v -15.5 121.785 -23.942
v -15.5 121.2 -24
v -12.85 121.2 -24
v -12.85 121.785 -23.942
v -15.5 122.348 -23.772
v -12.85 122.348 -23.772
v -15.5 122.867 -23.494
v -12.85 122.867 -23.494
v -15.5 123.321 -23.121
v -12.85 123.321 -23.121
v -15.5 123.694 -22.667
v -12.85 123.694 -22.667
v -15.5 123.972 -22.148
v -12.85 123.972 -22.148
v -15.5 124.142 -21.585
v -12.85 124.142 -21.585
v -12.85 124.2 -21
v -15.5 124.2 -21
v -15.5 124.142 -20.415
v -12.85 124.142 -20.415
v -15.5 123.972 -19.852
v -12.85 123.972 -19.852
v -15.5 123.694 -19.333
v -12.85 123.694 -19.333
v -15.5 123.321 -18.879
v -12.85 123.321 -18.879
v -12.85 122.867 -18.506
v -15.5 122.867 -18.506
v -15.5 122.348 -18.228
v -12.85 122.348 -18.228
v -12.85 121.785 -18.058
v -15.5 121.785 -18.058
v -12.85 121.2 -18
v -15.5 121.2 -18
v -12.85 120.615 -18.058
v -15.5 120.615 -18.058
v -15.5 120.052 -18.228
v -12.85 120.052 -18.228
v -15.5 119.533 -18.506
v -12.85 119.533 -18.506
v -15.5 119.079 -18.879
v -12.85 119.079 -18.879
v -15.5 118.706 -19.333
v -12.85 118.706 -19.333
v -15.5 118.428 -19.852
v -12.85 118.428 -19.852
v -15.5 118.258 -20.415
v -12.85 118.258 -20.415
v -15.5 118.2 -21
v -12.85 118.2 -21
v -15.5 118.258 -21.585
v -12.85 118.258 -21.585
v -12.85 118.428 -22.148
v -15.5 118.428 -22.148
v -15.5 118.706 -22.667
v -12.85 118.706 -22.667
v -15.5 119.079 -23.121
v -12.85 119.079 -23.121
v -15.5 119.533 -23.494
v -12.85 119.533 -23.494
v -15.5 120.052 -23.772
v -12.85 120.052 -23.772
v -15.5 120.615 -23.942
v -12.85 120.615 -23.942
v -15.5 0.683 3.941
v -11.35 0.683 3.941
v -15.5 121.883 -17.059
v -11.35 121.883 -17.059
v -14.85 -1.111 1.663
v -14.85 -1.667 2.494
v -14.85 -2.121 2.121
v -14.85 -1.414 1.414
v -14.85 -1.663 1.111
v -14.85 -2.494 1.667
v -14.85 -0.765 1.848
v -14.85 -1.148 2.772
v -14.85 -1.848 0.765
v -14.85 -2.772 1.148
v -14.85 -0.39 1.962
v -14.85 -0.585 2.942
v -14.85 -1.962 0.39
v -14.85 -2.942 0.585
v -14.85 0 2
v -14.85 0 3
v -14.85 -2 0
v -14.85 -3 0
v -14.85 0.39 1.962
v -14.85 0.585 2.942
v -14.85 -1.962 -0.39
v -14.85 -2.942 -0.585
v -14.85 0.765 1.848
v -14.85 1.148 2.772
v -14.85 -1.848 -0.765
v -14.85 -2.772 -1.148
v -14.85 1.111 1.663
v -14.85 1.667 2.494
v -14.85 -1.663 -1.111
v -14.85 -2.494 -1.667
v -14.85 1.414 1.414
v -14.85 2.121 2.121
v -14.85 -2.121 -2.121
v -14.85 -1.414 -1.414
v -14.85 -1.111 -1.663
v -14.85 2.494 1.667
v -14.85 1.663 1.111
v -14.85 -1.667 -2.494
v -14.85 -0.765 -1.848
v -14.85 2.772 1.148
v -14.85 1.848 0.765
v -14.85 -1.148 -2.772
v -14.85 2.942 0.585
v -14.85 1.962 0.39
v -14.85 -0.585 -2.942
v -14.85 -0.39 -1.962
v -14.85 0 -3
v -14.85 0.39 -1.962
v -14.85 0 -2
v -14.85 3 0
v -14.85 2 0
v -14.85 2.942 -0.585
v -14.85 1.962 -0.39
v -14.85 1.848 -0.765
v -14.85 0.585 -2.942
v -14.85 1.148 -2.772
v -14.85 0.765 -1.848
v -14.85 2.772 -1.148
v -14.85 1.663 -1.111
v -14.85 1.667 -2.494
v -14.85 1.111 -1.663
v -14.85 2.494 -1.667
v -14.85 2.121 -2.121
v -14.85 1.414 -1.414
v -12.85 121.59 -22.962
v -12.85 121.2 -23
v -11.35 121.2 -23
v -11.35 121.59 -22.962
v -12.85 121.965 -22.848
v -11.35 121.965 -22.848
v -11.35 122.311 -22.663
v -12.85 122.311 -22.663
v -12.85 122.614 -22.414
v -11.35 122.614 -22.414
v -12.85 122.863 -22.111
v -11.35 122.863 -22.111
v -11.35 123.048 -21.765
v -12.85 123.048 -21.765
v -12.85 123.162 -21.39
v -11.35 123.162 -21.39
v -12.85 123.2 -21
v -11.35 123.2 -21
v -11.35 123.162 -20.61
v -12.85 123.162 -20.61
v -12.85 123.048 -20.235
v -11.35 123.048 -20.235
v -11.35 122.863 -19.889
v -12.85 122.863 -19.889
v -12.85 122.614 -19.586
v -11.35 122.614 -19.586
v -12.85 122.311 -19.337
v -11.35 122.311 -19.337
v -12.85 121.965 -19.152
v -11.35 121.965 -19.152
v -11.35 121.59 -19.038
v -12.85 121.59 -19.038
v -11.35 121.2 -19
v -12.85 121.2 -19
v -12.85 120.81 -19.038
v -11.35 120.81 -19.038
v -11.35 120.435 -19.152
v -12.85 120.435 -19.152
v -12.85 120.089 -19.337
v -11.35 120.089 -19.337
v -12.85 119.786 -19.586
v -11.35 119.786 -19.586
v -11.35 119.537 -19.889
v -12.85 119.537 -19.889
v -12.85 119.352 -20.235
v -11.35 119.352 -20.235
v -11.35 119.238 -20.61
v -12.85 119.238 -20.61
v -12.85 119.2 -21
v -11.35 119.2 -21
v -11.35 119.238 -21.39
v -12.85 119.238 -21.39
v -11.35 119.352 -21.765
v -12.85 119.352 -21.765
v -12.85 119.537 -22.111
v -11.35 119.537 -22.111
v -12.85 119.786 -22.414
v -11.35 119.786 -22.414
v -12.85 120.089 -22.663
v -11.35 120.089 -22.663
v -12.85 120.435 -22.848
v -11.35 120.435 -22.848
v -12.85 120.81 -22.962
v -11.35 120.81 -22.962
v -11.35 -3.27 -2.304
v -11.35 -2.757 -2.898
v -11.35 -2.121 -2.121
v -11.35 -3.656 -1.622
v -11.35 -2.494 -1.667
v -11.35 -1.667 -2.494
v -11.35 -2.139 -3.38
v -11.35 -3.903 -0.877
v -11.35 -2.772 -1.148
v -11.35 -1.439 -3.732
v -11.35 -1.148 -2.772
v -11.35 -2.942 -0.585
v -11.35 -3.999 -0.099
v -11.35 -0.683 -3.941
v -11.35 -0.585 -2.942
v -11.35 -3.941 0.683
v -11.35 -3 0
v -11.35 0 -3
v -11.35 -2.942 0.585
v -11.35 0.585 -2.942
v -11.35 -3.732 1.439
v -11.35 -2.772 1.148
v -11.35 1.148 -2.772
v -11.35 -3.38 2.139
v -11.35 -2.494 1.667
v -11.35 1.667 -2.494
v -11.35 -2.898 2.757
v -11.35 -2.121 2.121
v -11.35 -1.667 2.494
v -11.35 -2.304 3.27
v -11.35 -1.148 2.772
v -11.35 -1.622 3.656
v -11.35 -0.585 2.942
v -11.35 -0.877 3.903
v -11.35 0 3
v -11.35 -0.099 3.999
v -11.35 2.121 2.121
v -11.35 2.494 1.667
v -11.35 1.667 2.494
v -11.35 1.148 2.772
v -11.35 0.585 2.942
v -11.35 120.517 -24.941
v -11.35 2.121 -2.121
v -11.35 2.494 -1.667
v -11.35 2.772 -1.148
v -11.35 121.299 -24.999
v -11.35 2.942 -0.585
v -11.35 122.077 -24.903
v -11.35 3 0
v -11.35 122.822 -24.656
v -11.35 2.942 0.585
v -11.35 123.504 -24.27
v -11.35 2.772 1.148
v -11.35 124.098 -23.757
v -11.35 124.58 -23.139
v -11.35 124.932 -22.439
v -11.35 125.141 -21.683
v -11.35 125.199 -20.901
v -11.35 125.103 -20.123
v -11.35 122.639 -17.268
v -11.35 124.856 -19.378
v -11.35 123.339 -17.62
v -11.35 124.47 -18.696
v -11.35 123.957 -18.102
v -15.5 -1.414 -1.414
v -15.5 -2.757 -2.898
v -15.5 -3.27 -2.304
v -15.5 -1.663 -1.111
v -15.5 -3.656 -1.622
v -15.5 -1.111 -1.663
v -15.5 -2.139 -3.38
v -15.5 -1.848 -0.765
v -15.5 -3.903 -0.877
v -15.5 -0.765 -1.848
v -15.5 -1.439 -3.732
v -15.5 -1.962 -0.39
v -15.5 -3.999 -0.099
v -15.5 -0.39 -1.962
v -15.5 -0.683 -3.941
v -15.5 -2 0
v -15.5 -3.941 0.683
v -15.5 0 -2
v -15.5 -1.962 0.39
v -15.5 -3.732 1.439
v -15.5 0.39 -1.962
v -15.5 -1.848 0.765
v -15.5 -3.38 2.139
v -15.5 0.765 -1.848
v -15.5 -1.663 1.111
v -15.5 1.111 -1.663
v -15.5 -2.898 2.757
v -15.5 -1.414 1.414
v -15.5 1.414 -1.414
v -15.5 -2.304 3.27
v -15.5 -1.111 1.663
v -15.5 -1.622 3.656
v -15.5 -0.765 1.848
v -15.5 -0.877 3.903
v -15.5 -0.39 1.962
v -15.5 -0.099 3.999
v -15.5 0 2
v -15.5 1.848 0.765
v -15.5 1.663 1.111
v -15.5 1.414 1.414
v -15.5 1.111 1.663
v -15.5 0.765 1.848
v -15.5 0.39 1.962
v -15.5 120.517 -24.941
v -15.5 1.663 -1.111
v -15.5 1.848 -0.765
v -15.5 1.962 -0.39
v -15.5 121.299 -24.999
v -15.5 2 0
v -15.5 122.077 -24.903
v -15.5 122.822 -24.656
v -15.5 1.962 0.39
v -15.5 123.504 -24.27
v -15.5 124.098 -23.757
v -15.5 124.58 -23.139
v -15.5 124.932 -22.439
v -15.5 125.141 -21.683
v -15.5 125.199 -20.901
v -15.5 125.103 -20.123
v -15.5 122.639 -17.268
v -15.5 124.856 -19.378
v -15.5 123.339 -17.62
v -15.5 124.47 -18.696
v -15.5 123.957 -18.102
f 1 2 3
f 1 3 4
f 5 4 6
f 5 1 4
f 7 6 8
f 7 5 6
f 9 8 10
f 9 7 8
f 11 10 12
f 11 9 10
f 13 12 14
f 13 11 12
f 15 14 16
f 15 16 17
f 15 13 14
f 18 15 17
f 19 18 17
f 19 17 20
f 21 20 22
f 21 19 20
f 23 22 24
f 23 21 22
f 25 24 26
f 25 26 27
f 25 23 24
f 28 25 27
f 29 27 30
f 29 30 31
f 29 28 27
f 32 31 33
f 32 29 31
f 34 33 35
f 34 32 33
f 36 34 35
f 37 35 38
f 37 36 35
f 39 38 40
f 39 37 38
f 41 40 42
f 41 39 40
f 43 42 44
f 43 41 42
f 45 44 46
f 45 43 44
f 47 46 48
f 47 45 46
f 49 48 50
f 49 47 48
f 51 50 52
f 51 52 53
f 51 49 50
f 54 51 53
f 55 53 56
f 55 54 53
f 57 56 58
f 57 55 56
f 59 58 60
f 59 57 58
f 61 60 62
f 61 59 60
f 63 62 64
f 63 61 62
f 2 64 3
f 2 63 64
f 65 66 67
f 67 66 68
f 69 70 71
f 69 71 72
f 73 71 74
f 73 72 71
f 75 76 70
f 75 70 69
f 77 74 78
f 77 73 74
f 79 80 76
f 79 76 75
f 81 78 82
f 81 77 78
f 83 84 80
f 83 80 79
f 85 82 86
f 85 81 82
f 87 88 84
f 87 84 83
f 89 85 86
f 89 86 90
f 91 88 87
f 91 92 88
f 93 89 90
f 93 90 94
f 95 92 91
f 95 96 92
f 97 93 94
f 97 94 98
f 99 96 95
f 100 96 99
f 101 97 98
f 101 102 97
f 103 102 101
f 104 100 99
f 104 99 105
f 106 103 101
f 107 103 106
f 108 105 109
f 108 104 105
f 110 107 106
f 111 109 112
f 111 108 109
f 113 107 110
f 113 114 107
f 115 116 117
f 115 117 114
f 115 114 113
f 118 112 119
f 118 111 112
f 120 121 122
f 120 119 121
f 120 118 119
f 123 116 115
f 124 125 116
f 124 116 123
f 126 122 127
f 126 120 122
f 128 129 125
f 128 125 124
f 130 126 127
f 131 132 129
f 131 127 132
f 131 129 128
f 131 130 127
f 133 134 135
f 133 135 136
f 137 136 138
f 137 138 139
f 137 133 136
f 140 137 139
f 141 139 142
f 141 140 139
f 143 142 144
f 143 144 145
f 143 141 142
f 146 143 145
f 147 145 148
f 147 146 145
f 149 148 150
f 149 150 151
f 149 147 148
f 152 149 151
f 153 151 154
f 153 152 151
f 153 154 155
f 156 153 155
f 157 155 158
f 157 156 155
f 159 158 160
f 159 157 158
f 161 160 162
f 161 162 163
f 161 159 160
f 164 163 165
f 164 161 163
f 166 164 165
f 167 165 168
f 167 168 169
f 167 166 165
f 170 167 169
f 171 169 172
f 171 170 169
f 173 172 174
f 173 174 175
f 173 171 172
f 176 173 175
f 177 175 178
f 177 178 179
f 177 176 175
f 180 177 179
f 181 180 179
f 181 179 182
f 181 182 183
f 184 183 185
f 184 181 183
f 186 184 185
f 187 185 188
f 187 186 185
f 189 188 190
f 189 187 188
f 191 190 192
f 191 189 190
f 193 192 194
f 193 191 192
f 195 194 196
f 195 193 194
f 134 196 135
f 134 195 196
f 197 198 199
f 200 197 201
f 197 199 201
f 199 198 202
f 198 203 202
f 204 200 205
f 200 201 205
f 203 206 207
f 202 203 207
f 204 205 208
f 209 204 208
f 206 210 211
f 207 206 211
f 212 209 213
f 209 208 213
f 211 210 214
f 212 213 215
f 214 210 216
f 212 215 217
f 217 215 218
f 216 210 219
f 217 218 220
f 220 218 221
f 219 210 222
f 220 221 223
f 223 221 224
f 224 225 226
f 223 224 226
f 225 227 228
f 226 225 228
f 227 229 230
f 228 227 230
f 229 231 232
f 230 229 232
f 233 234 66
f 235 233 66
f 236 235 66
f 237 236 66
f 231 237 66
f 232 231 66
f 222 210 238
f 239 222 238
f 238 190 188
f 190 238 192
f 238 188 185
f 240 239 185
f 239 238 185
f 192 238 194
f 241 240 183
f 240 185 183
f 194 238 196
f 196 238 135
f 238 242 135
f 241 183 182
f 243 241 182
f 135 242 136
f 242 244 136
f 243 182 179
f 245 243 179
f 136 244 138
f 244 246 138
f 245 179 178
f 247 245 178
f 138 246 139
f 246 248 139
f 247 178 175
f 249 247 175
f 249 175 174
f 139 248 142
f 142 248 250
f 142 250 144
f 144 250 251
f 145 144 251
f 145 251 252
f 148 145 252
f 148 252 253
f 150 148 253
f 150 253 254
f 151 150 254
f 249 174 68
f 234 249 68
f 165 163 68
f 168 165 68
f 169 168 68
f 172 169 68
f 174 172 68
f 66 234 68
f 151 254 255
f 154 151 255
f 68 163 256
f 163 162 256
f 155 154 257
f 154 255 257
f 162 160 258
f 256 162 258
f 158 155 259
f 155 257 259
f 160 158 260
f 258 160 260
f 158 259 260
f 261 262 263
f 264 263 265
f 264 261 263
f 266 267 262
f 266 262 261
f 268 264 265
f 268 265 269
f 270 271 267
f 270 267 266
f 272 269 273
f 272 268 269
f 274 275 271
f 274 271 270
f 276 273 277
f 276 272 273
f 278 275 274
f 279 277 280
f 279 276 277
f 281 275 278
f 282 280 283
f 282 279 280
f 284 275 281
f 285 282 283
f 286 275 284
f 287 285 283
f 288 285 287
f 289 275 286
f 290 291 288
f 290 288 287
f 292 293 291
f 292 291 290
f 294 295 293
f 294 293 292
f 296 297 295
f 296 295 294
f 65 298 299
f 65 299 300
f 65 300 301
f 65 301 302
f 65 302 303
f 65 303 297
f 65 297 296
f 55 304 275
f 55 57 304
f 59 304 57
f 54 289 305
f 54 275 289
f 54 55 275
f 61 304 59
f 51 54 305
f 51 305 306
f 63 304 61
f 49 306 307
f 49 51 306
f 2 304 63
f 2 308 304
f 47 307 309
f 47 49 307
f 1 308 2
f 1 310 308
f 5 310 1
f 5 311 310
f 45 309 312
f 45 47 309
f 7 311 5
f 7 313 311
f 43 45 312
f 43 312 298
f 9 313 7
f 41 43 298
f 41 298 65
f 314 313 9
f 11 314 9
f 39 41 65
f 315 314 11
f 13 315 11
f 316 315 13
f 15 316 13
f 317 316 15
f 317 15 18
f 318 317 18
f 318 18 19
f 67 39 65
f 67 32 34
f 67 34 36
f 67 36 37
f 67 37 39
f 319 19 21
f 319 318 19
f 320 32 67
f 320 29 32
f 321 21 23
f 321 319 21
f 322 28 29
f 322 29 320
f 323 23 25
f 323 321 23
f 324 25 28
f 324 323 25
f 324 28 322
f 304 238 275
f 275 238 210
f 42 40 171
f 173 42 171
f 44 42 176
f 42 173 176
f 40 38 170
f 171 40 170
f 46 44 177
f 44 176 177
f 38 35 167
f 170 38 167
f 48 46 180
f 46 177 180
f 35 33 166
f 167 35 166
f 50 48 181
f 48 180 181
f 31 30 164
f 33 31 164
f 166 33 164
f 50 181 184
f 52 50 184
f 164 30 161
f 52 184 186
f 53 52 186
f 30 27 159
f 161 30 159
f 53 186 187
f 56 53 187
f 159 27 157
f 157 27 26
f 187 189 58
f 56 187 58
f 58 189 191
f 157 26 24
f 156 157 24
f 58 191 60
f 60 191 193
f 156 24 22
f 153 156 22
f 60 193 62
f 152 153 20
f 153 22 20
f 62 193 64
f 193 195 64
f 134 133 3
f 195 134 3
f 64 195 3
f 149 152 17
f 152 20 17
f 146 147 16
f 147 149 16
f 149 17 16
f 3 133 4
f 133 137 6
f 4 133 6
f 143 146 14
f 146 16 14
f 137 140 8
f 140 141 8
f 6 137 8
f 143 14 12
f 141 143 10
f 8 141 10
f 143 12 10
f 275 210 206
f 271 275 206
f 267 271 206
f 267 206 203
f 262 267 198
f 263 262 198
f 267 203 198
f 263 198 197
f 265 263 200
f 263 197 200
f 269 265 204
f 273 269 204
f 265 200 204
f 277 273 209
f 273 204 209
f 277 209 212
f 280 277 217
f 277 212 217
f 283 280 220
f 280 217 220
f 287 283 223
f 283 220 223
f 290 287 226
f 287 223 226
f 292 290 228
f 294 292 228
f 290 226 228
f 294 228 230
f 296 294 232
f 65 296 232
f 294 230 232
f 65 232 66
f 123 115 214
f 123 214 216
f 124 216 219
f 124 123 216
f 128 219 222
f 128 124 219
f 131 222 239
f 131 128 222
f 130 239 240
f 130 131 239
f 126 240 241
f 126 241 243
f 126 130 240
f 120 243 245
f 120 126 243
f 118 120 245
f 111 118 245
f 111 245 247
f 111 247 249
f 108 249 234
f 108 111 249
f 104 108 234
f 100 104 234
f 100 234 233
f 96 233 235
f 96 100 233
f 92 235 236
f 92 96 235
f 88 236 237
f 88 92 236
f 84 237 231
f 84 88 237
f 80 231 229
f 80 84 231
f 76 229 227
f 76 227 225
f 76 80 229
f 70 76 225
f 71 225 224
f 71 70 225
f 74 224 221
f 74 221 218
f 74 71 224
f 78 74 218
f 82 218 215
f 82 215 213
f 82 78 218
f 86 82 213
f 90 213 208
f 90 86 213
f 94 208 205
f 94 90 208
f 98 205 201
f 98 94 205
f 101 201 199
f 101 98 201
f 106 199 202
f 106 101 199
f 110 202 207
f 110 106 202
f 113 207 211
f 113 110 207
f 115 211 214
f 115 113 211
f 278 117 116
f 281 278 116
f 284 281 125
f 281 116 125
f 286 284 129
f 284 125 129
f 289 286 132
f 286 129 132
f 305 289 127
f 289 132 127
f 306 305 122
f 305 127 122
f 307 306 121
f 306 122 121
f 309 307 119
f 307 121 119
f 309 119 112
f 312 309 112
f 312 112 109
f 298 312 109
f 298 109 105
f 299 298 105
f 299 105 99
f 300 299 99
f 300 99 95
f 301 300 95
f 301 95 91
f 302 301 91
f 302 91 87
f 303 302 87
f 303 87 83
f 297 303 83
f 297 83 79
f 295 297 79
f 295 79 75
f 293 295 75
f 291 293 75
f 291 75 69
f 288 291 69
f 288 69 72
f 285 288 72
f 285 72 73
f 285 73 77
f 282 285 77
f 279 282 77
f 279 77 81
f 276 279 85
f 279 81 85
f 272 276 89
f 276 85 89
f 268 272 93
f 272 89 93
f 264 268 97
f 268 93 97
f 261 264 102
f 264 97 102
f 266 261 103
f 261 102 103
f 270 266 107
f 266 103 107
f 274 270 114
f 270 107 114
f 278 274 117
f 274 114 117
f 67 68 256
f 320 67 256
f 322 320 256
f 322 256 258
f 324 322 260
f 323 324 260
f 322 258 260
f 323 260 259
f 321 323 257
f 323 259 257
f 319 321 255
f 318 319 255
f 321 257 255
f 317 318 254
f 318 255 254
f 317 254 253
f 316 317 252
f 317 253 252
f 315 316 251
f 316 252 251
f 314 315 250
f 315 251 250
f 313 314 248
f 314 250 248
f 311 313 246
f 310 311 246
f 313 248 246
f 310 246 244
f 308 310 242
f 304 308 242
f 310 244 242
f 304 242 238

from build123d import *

# Parameters (mm, degrees)
BOSS_EXTRUDE1_START = -11.35
SKETCH2_R           = 2
BOSS_EXTRUDE1_DEPTH = 4.15
CUT_EXTRUDE1_START  = -15.5
SKETCH2_3_R         = 3
SKETCH2_3_R_2       = 2
CUT_EXTRUDE1_DEPTH  = 2.65
CUT_EXTRUDE2_START  = -12.85
SKETCH2_4_R         = 2
CUT_EXTRUDE2_DEPTH  = 1.5
CUT_EXTRUDE3_START  = -14.85
SKETCH2_5_R         = 3
CUT_EXTRUDE3_DEPTH  = 3.5


with BuildPart() as part:
    # Sketch2 → Boss-Extrude1 (new body)
    with BuildSketch(Plane(origin=(0, 0, 0), x_dir=(0, 0, -1), z_dir=(1, 0, 0)).offset(BOSS_EXTRUDE1_START)):
        with BuildLine():
            Line((24.941275851, 120.517105669), (3.941275851, -0.682894331))
            ThreePointArc((3.941275851, -0.682894331), (-0.682894331, -3.941275851), (-3.941275851, 0.682894331))
            Line((-3.941275851, 0.682894331), (17.058724149, 121.882894331))
            ThreePointArc((17.058724149, 121.882894331), (21.682894331, 125.141275851), (24.941275851, 120.517105669))
        make_face()
        Circle(SKETCH2_R, mode=Mode.SUBTRACT)
    extrude(amount=-BOSS_EXTRUDE1_DEPTH)

    # Sketch2<3> → Cut-Extrude1 (cut)
    # profile 1 of 2: a face of its own
    with BuildSketch(Plane(origin=(0, 0, 0), x_dir=(0, 0, -1), z_dir=(1, 0, 0)).offset(CUT_EXTRUDE1_START)):
        with Locations((21, 121.2)):
            Circle(SKETCH2_3_R)
        with Locations((21, 121.2)):
            Circle(SKETCH2_3_R_2, mode=Mode.SUBTRACT)
    # profile 2 of 2: a face of its own
    with BuildSketch(Plane(origin=(0, 0, 0), x_dir=(0, 0, -1), z_dir=(1, 0, 0)).offset(CUT_EXTRUDE1_START)):
        with Locations((21, 121.2)):
            Circle(SKETCH2_3_R_2)
    extrude(amount=CUT_EXTRUDE1_DEPTH, mode=Mode.SUBTRACT)

    # Sketch2<4> → Cut-Extrude2 (cut)
    with BuildSketch(Plane(origin=(0, 0, 0), x_dir=(0, 0, -1), z_dir=(1, 0, 0)).offset(CUT_EXTRUDE2_START)):
        with Locations((21, 121.2)):
            Circle(SKETCH2_4_R)
    extrude(amount=CUT_EXTRUDE2_DEPTH, mode=Mode.SUBTRACT)

    # Sketch2<5> → Cut-Extrude3 (cut)
    with BuildSketch(Plane(origin=(0, 0, 0), x_dir=(0, 0, -1), z_dir=(1, 0, 0)).offset(CUT_EXTRUDE3_START)):
        Circle(SKETCH2_5_R)
    extrude(amount=CUT_EXTRUDE3_DEPTH, mode=Mode.SUBTRACT)


solid = part.part
